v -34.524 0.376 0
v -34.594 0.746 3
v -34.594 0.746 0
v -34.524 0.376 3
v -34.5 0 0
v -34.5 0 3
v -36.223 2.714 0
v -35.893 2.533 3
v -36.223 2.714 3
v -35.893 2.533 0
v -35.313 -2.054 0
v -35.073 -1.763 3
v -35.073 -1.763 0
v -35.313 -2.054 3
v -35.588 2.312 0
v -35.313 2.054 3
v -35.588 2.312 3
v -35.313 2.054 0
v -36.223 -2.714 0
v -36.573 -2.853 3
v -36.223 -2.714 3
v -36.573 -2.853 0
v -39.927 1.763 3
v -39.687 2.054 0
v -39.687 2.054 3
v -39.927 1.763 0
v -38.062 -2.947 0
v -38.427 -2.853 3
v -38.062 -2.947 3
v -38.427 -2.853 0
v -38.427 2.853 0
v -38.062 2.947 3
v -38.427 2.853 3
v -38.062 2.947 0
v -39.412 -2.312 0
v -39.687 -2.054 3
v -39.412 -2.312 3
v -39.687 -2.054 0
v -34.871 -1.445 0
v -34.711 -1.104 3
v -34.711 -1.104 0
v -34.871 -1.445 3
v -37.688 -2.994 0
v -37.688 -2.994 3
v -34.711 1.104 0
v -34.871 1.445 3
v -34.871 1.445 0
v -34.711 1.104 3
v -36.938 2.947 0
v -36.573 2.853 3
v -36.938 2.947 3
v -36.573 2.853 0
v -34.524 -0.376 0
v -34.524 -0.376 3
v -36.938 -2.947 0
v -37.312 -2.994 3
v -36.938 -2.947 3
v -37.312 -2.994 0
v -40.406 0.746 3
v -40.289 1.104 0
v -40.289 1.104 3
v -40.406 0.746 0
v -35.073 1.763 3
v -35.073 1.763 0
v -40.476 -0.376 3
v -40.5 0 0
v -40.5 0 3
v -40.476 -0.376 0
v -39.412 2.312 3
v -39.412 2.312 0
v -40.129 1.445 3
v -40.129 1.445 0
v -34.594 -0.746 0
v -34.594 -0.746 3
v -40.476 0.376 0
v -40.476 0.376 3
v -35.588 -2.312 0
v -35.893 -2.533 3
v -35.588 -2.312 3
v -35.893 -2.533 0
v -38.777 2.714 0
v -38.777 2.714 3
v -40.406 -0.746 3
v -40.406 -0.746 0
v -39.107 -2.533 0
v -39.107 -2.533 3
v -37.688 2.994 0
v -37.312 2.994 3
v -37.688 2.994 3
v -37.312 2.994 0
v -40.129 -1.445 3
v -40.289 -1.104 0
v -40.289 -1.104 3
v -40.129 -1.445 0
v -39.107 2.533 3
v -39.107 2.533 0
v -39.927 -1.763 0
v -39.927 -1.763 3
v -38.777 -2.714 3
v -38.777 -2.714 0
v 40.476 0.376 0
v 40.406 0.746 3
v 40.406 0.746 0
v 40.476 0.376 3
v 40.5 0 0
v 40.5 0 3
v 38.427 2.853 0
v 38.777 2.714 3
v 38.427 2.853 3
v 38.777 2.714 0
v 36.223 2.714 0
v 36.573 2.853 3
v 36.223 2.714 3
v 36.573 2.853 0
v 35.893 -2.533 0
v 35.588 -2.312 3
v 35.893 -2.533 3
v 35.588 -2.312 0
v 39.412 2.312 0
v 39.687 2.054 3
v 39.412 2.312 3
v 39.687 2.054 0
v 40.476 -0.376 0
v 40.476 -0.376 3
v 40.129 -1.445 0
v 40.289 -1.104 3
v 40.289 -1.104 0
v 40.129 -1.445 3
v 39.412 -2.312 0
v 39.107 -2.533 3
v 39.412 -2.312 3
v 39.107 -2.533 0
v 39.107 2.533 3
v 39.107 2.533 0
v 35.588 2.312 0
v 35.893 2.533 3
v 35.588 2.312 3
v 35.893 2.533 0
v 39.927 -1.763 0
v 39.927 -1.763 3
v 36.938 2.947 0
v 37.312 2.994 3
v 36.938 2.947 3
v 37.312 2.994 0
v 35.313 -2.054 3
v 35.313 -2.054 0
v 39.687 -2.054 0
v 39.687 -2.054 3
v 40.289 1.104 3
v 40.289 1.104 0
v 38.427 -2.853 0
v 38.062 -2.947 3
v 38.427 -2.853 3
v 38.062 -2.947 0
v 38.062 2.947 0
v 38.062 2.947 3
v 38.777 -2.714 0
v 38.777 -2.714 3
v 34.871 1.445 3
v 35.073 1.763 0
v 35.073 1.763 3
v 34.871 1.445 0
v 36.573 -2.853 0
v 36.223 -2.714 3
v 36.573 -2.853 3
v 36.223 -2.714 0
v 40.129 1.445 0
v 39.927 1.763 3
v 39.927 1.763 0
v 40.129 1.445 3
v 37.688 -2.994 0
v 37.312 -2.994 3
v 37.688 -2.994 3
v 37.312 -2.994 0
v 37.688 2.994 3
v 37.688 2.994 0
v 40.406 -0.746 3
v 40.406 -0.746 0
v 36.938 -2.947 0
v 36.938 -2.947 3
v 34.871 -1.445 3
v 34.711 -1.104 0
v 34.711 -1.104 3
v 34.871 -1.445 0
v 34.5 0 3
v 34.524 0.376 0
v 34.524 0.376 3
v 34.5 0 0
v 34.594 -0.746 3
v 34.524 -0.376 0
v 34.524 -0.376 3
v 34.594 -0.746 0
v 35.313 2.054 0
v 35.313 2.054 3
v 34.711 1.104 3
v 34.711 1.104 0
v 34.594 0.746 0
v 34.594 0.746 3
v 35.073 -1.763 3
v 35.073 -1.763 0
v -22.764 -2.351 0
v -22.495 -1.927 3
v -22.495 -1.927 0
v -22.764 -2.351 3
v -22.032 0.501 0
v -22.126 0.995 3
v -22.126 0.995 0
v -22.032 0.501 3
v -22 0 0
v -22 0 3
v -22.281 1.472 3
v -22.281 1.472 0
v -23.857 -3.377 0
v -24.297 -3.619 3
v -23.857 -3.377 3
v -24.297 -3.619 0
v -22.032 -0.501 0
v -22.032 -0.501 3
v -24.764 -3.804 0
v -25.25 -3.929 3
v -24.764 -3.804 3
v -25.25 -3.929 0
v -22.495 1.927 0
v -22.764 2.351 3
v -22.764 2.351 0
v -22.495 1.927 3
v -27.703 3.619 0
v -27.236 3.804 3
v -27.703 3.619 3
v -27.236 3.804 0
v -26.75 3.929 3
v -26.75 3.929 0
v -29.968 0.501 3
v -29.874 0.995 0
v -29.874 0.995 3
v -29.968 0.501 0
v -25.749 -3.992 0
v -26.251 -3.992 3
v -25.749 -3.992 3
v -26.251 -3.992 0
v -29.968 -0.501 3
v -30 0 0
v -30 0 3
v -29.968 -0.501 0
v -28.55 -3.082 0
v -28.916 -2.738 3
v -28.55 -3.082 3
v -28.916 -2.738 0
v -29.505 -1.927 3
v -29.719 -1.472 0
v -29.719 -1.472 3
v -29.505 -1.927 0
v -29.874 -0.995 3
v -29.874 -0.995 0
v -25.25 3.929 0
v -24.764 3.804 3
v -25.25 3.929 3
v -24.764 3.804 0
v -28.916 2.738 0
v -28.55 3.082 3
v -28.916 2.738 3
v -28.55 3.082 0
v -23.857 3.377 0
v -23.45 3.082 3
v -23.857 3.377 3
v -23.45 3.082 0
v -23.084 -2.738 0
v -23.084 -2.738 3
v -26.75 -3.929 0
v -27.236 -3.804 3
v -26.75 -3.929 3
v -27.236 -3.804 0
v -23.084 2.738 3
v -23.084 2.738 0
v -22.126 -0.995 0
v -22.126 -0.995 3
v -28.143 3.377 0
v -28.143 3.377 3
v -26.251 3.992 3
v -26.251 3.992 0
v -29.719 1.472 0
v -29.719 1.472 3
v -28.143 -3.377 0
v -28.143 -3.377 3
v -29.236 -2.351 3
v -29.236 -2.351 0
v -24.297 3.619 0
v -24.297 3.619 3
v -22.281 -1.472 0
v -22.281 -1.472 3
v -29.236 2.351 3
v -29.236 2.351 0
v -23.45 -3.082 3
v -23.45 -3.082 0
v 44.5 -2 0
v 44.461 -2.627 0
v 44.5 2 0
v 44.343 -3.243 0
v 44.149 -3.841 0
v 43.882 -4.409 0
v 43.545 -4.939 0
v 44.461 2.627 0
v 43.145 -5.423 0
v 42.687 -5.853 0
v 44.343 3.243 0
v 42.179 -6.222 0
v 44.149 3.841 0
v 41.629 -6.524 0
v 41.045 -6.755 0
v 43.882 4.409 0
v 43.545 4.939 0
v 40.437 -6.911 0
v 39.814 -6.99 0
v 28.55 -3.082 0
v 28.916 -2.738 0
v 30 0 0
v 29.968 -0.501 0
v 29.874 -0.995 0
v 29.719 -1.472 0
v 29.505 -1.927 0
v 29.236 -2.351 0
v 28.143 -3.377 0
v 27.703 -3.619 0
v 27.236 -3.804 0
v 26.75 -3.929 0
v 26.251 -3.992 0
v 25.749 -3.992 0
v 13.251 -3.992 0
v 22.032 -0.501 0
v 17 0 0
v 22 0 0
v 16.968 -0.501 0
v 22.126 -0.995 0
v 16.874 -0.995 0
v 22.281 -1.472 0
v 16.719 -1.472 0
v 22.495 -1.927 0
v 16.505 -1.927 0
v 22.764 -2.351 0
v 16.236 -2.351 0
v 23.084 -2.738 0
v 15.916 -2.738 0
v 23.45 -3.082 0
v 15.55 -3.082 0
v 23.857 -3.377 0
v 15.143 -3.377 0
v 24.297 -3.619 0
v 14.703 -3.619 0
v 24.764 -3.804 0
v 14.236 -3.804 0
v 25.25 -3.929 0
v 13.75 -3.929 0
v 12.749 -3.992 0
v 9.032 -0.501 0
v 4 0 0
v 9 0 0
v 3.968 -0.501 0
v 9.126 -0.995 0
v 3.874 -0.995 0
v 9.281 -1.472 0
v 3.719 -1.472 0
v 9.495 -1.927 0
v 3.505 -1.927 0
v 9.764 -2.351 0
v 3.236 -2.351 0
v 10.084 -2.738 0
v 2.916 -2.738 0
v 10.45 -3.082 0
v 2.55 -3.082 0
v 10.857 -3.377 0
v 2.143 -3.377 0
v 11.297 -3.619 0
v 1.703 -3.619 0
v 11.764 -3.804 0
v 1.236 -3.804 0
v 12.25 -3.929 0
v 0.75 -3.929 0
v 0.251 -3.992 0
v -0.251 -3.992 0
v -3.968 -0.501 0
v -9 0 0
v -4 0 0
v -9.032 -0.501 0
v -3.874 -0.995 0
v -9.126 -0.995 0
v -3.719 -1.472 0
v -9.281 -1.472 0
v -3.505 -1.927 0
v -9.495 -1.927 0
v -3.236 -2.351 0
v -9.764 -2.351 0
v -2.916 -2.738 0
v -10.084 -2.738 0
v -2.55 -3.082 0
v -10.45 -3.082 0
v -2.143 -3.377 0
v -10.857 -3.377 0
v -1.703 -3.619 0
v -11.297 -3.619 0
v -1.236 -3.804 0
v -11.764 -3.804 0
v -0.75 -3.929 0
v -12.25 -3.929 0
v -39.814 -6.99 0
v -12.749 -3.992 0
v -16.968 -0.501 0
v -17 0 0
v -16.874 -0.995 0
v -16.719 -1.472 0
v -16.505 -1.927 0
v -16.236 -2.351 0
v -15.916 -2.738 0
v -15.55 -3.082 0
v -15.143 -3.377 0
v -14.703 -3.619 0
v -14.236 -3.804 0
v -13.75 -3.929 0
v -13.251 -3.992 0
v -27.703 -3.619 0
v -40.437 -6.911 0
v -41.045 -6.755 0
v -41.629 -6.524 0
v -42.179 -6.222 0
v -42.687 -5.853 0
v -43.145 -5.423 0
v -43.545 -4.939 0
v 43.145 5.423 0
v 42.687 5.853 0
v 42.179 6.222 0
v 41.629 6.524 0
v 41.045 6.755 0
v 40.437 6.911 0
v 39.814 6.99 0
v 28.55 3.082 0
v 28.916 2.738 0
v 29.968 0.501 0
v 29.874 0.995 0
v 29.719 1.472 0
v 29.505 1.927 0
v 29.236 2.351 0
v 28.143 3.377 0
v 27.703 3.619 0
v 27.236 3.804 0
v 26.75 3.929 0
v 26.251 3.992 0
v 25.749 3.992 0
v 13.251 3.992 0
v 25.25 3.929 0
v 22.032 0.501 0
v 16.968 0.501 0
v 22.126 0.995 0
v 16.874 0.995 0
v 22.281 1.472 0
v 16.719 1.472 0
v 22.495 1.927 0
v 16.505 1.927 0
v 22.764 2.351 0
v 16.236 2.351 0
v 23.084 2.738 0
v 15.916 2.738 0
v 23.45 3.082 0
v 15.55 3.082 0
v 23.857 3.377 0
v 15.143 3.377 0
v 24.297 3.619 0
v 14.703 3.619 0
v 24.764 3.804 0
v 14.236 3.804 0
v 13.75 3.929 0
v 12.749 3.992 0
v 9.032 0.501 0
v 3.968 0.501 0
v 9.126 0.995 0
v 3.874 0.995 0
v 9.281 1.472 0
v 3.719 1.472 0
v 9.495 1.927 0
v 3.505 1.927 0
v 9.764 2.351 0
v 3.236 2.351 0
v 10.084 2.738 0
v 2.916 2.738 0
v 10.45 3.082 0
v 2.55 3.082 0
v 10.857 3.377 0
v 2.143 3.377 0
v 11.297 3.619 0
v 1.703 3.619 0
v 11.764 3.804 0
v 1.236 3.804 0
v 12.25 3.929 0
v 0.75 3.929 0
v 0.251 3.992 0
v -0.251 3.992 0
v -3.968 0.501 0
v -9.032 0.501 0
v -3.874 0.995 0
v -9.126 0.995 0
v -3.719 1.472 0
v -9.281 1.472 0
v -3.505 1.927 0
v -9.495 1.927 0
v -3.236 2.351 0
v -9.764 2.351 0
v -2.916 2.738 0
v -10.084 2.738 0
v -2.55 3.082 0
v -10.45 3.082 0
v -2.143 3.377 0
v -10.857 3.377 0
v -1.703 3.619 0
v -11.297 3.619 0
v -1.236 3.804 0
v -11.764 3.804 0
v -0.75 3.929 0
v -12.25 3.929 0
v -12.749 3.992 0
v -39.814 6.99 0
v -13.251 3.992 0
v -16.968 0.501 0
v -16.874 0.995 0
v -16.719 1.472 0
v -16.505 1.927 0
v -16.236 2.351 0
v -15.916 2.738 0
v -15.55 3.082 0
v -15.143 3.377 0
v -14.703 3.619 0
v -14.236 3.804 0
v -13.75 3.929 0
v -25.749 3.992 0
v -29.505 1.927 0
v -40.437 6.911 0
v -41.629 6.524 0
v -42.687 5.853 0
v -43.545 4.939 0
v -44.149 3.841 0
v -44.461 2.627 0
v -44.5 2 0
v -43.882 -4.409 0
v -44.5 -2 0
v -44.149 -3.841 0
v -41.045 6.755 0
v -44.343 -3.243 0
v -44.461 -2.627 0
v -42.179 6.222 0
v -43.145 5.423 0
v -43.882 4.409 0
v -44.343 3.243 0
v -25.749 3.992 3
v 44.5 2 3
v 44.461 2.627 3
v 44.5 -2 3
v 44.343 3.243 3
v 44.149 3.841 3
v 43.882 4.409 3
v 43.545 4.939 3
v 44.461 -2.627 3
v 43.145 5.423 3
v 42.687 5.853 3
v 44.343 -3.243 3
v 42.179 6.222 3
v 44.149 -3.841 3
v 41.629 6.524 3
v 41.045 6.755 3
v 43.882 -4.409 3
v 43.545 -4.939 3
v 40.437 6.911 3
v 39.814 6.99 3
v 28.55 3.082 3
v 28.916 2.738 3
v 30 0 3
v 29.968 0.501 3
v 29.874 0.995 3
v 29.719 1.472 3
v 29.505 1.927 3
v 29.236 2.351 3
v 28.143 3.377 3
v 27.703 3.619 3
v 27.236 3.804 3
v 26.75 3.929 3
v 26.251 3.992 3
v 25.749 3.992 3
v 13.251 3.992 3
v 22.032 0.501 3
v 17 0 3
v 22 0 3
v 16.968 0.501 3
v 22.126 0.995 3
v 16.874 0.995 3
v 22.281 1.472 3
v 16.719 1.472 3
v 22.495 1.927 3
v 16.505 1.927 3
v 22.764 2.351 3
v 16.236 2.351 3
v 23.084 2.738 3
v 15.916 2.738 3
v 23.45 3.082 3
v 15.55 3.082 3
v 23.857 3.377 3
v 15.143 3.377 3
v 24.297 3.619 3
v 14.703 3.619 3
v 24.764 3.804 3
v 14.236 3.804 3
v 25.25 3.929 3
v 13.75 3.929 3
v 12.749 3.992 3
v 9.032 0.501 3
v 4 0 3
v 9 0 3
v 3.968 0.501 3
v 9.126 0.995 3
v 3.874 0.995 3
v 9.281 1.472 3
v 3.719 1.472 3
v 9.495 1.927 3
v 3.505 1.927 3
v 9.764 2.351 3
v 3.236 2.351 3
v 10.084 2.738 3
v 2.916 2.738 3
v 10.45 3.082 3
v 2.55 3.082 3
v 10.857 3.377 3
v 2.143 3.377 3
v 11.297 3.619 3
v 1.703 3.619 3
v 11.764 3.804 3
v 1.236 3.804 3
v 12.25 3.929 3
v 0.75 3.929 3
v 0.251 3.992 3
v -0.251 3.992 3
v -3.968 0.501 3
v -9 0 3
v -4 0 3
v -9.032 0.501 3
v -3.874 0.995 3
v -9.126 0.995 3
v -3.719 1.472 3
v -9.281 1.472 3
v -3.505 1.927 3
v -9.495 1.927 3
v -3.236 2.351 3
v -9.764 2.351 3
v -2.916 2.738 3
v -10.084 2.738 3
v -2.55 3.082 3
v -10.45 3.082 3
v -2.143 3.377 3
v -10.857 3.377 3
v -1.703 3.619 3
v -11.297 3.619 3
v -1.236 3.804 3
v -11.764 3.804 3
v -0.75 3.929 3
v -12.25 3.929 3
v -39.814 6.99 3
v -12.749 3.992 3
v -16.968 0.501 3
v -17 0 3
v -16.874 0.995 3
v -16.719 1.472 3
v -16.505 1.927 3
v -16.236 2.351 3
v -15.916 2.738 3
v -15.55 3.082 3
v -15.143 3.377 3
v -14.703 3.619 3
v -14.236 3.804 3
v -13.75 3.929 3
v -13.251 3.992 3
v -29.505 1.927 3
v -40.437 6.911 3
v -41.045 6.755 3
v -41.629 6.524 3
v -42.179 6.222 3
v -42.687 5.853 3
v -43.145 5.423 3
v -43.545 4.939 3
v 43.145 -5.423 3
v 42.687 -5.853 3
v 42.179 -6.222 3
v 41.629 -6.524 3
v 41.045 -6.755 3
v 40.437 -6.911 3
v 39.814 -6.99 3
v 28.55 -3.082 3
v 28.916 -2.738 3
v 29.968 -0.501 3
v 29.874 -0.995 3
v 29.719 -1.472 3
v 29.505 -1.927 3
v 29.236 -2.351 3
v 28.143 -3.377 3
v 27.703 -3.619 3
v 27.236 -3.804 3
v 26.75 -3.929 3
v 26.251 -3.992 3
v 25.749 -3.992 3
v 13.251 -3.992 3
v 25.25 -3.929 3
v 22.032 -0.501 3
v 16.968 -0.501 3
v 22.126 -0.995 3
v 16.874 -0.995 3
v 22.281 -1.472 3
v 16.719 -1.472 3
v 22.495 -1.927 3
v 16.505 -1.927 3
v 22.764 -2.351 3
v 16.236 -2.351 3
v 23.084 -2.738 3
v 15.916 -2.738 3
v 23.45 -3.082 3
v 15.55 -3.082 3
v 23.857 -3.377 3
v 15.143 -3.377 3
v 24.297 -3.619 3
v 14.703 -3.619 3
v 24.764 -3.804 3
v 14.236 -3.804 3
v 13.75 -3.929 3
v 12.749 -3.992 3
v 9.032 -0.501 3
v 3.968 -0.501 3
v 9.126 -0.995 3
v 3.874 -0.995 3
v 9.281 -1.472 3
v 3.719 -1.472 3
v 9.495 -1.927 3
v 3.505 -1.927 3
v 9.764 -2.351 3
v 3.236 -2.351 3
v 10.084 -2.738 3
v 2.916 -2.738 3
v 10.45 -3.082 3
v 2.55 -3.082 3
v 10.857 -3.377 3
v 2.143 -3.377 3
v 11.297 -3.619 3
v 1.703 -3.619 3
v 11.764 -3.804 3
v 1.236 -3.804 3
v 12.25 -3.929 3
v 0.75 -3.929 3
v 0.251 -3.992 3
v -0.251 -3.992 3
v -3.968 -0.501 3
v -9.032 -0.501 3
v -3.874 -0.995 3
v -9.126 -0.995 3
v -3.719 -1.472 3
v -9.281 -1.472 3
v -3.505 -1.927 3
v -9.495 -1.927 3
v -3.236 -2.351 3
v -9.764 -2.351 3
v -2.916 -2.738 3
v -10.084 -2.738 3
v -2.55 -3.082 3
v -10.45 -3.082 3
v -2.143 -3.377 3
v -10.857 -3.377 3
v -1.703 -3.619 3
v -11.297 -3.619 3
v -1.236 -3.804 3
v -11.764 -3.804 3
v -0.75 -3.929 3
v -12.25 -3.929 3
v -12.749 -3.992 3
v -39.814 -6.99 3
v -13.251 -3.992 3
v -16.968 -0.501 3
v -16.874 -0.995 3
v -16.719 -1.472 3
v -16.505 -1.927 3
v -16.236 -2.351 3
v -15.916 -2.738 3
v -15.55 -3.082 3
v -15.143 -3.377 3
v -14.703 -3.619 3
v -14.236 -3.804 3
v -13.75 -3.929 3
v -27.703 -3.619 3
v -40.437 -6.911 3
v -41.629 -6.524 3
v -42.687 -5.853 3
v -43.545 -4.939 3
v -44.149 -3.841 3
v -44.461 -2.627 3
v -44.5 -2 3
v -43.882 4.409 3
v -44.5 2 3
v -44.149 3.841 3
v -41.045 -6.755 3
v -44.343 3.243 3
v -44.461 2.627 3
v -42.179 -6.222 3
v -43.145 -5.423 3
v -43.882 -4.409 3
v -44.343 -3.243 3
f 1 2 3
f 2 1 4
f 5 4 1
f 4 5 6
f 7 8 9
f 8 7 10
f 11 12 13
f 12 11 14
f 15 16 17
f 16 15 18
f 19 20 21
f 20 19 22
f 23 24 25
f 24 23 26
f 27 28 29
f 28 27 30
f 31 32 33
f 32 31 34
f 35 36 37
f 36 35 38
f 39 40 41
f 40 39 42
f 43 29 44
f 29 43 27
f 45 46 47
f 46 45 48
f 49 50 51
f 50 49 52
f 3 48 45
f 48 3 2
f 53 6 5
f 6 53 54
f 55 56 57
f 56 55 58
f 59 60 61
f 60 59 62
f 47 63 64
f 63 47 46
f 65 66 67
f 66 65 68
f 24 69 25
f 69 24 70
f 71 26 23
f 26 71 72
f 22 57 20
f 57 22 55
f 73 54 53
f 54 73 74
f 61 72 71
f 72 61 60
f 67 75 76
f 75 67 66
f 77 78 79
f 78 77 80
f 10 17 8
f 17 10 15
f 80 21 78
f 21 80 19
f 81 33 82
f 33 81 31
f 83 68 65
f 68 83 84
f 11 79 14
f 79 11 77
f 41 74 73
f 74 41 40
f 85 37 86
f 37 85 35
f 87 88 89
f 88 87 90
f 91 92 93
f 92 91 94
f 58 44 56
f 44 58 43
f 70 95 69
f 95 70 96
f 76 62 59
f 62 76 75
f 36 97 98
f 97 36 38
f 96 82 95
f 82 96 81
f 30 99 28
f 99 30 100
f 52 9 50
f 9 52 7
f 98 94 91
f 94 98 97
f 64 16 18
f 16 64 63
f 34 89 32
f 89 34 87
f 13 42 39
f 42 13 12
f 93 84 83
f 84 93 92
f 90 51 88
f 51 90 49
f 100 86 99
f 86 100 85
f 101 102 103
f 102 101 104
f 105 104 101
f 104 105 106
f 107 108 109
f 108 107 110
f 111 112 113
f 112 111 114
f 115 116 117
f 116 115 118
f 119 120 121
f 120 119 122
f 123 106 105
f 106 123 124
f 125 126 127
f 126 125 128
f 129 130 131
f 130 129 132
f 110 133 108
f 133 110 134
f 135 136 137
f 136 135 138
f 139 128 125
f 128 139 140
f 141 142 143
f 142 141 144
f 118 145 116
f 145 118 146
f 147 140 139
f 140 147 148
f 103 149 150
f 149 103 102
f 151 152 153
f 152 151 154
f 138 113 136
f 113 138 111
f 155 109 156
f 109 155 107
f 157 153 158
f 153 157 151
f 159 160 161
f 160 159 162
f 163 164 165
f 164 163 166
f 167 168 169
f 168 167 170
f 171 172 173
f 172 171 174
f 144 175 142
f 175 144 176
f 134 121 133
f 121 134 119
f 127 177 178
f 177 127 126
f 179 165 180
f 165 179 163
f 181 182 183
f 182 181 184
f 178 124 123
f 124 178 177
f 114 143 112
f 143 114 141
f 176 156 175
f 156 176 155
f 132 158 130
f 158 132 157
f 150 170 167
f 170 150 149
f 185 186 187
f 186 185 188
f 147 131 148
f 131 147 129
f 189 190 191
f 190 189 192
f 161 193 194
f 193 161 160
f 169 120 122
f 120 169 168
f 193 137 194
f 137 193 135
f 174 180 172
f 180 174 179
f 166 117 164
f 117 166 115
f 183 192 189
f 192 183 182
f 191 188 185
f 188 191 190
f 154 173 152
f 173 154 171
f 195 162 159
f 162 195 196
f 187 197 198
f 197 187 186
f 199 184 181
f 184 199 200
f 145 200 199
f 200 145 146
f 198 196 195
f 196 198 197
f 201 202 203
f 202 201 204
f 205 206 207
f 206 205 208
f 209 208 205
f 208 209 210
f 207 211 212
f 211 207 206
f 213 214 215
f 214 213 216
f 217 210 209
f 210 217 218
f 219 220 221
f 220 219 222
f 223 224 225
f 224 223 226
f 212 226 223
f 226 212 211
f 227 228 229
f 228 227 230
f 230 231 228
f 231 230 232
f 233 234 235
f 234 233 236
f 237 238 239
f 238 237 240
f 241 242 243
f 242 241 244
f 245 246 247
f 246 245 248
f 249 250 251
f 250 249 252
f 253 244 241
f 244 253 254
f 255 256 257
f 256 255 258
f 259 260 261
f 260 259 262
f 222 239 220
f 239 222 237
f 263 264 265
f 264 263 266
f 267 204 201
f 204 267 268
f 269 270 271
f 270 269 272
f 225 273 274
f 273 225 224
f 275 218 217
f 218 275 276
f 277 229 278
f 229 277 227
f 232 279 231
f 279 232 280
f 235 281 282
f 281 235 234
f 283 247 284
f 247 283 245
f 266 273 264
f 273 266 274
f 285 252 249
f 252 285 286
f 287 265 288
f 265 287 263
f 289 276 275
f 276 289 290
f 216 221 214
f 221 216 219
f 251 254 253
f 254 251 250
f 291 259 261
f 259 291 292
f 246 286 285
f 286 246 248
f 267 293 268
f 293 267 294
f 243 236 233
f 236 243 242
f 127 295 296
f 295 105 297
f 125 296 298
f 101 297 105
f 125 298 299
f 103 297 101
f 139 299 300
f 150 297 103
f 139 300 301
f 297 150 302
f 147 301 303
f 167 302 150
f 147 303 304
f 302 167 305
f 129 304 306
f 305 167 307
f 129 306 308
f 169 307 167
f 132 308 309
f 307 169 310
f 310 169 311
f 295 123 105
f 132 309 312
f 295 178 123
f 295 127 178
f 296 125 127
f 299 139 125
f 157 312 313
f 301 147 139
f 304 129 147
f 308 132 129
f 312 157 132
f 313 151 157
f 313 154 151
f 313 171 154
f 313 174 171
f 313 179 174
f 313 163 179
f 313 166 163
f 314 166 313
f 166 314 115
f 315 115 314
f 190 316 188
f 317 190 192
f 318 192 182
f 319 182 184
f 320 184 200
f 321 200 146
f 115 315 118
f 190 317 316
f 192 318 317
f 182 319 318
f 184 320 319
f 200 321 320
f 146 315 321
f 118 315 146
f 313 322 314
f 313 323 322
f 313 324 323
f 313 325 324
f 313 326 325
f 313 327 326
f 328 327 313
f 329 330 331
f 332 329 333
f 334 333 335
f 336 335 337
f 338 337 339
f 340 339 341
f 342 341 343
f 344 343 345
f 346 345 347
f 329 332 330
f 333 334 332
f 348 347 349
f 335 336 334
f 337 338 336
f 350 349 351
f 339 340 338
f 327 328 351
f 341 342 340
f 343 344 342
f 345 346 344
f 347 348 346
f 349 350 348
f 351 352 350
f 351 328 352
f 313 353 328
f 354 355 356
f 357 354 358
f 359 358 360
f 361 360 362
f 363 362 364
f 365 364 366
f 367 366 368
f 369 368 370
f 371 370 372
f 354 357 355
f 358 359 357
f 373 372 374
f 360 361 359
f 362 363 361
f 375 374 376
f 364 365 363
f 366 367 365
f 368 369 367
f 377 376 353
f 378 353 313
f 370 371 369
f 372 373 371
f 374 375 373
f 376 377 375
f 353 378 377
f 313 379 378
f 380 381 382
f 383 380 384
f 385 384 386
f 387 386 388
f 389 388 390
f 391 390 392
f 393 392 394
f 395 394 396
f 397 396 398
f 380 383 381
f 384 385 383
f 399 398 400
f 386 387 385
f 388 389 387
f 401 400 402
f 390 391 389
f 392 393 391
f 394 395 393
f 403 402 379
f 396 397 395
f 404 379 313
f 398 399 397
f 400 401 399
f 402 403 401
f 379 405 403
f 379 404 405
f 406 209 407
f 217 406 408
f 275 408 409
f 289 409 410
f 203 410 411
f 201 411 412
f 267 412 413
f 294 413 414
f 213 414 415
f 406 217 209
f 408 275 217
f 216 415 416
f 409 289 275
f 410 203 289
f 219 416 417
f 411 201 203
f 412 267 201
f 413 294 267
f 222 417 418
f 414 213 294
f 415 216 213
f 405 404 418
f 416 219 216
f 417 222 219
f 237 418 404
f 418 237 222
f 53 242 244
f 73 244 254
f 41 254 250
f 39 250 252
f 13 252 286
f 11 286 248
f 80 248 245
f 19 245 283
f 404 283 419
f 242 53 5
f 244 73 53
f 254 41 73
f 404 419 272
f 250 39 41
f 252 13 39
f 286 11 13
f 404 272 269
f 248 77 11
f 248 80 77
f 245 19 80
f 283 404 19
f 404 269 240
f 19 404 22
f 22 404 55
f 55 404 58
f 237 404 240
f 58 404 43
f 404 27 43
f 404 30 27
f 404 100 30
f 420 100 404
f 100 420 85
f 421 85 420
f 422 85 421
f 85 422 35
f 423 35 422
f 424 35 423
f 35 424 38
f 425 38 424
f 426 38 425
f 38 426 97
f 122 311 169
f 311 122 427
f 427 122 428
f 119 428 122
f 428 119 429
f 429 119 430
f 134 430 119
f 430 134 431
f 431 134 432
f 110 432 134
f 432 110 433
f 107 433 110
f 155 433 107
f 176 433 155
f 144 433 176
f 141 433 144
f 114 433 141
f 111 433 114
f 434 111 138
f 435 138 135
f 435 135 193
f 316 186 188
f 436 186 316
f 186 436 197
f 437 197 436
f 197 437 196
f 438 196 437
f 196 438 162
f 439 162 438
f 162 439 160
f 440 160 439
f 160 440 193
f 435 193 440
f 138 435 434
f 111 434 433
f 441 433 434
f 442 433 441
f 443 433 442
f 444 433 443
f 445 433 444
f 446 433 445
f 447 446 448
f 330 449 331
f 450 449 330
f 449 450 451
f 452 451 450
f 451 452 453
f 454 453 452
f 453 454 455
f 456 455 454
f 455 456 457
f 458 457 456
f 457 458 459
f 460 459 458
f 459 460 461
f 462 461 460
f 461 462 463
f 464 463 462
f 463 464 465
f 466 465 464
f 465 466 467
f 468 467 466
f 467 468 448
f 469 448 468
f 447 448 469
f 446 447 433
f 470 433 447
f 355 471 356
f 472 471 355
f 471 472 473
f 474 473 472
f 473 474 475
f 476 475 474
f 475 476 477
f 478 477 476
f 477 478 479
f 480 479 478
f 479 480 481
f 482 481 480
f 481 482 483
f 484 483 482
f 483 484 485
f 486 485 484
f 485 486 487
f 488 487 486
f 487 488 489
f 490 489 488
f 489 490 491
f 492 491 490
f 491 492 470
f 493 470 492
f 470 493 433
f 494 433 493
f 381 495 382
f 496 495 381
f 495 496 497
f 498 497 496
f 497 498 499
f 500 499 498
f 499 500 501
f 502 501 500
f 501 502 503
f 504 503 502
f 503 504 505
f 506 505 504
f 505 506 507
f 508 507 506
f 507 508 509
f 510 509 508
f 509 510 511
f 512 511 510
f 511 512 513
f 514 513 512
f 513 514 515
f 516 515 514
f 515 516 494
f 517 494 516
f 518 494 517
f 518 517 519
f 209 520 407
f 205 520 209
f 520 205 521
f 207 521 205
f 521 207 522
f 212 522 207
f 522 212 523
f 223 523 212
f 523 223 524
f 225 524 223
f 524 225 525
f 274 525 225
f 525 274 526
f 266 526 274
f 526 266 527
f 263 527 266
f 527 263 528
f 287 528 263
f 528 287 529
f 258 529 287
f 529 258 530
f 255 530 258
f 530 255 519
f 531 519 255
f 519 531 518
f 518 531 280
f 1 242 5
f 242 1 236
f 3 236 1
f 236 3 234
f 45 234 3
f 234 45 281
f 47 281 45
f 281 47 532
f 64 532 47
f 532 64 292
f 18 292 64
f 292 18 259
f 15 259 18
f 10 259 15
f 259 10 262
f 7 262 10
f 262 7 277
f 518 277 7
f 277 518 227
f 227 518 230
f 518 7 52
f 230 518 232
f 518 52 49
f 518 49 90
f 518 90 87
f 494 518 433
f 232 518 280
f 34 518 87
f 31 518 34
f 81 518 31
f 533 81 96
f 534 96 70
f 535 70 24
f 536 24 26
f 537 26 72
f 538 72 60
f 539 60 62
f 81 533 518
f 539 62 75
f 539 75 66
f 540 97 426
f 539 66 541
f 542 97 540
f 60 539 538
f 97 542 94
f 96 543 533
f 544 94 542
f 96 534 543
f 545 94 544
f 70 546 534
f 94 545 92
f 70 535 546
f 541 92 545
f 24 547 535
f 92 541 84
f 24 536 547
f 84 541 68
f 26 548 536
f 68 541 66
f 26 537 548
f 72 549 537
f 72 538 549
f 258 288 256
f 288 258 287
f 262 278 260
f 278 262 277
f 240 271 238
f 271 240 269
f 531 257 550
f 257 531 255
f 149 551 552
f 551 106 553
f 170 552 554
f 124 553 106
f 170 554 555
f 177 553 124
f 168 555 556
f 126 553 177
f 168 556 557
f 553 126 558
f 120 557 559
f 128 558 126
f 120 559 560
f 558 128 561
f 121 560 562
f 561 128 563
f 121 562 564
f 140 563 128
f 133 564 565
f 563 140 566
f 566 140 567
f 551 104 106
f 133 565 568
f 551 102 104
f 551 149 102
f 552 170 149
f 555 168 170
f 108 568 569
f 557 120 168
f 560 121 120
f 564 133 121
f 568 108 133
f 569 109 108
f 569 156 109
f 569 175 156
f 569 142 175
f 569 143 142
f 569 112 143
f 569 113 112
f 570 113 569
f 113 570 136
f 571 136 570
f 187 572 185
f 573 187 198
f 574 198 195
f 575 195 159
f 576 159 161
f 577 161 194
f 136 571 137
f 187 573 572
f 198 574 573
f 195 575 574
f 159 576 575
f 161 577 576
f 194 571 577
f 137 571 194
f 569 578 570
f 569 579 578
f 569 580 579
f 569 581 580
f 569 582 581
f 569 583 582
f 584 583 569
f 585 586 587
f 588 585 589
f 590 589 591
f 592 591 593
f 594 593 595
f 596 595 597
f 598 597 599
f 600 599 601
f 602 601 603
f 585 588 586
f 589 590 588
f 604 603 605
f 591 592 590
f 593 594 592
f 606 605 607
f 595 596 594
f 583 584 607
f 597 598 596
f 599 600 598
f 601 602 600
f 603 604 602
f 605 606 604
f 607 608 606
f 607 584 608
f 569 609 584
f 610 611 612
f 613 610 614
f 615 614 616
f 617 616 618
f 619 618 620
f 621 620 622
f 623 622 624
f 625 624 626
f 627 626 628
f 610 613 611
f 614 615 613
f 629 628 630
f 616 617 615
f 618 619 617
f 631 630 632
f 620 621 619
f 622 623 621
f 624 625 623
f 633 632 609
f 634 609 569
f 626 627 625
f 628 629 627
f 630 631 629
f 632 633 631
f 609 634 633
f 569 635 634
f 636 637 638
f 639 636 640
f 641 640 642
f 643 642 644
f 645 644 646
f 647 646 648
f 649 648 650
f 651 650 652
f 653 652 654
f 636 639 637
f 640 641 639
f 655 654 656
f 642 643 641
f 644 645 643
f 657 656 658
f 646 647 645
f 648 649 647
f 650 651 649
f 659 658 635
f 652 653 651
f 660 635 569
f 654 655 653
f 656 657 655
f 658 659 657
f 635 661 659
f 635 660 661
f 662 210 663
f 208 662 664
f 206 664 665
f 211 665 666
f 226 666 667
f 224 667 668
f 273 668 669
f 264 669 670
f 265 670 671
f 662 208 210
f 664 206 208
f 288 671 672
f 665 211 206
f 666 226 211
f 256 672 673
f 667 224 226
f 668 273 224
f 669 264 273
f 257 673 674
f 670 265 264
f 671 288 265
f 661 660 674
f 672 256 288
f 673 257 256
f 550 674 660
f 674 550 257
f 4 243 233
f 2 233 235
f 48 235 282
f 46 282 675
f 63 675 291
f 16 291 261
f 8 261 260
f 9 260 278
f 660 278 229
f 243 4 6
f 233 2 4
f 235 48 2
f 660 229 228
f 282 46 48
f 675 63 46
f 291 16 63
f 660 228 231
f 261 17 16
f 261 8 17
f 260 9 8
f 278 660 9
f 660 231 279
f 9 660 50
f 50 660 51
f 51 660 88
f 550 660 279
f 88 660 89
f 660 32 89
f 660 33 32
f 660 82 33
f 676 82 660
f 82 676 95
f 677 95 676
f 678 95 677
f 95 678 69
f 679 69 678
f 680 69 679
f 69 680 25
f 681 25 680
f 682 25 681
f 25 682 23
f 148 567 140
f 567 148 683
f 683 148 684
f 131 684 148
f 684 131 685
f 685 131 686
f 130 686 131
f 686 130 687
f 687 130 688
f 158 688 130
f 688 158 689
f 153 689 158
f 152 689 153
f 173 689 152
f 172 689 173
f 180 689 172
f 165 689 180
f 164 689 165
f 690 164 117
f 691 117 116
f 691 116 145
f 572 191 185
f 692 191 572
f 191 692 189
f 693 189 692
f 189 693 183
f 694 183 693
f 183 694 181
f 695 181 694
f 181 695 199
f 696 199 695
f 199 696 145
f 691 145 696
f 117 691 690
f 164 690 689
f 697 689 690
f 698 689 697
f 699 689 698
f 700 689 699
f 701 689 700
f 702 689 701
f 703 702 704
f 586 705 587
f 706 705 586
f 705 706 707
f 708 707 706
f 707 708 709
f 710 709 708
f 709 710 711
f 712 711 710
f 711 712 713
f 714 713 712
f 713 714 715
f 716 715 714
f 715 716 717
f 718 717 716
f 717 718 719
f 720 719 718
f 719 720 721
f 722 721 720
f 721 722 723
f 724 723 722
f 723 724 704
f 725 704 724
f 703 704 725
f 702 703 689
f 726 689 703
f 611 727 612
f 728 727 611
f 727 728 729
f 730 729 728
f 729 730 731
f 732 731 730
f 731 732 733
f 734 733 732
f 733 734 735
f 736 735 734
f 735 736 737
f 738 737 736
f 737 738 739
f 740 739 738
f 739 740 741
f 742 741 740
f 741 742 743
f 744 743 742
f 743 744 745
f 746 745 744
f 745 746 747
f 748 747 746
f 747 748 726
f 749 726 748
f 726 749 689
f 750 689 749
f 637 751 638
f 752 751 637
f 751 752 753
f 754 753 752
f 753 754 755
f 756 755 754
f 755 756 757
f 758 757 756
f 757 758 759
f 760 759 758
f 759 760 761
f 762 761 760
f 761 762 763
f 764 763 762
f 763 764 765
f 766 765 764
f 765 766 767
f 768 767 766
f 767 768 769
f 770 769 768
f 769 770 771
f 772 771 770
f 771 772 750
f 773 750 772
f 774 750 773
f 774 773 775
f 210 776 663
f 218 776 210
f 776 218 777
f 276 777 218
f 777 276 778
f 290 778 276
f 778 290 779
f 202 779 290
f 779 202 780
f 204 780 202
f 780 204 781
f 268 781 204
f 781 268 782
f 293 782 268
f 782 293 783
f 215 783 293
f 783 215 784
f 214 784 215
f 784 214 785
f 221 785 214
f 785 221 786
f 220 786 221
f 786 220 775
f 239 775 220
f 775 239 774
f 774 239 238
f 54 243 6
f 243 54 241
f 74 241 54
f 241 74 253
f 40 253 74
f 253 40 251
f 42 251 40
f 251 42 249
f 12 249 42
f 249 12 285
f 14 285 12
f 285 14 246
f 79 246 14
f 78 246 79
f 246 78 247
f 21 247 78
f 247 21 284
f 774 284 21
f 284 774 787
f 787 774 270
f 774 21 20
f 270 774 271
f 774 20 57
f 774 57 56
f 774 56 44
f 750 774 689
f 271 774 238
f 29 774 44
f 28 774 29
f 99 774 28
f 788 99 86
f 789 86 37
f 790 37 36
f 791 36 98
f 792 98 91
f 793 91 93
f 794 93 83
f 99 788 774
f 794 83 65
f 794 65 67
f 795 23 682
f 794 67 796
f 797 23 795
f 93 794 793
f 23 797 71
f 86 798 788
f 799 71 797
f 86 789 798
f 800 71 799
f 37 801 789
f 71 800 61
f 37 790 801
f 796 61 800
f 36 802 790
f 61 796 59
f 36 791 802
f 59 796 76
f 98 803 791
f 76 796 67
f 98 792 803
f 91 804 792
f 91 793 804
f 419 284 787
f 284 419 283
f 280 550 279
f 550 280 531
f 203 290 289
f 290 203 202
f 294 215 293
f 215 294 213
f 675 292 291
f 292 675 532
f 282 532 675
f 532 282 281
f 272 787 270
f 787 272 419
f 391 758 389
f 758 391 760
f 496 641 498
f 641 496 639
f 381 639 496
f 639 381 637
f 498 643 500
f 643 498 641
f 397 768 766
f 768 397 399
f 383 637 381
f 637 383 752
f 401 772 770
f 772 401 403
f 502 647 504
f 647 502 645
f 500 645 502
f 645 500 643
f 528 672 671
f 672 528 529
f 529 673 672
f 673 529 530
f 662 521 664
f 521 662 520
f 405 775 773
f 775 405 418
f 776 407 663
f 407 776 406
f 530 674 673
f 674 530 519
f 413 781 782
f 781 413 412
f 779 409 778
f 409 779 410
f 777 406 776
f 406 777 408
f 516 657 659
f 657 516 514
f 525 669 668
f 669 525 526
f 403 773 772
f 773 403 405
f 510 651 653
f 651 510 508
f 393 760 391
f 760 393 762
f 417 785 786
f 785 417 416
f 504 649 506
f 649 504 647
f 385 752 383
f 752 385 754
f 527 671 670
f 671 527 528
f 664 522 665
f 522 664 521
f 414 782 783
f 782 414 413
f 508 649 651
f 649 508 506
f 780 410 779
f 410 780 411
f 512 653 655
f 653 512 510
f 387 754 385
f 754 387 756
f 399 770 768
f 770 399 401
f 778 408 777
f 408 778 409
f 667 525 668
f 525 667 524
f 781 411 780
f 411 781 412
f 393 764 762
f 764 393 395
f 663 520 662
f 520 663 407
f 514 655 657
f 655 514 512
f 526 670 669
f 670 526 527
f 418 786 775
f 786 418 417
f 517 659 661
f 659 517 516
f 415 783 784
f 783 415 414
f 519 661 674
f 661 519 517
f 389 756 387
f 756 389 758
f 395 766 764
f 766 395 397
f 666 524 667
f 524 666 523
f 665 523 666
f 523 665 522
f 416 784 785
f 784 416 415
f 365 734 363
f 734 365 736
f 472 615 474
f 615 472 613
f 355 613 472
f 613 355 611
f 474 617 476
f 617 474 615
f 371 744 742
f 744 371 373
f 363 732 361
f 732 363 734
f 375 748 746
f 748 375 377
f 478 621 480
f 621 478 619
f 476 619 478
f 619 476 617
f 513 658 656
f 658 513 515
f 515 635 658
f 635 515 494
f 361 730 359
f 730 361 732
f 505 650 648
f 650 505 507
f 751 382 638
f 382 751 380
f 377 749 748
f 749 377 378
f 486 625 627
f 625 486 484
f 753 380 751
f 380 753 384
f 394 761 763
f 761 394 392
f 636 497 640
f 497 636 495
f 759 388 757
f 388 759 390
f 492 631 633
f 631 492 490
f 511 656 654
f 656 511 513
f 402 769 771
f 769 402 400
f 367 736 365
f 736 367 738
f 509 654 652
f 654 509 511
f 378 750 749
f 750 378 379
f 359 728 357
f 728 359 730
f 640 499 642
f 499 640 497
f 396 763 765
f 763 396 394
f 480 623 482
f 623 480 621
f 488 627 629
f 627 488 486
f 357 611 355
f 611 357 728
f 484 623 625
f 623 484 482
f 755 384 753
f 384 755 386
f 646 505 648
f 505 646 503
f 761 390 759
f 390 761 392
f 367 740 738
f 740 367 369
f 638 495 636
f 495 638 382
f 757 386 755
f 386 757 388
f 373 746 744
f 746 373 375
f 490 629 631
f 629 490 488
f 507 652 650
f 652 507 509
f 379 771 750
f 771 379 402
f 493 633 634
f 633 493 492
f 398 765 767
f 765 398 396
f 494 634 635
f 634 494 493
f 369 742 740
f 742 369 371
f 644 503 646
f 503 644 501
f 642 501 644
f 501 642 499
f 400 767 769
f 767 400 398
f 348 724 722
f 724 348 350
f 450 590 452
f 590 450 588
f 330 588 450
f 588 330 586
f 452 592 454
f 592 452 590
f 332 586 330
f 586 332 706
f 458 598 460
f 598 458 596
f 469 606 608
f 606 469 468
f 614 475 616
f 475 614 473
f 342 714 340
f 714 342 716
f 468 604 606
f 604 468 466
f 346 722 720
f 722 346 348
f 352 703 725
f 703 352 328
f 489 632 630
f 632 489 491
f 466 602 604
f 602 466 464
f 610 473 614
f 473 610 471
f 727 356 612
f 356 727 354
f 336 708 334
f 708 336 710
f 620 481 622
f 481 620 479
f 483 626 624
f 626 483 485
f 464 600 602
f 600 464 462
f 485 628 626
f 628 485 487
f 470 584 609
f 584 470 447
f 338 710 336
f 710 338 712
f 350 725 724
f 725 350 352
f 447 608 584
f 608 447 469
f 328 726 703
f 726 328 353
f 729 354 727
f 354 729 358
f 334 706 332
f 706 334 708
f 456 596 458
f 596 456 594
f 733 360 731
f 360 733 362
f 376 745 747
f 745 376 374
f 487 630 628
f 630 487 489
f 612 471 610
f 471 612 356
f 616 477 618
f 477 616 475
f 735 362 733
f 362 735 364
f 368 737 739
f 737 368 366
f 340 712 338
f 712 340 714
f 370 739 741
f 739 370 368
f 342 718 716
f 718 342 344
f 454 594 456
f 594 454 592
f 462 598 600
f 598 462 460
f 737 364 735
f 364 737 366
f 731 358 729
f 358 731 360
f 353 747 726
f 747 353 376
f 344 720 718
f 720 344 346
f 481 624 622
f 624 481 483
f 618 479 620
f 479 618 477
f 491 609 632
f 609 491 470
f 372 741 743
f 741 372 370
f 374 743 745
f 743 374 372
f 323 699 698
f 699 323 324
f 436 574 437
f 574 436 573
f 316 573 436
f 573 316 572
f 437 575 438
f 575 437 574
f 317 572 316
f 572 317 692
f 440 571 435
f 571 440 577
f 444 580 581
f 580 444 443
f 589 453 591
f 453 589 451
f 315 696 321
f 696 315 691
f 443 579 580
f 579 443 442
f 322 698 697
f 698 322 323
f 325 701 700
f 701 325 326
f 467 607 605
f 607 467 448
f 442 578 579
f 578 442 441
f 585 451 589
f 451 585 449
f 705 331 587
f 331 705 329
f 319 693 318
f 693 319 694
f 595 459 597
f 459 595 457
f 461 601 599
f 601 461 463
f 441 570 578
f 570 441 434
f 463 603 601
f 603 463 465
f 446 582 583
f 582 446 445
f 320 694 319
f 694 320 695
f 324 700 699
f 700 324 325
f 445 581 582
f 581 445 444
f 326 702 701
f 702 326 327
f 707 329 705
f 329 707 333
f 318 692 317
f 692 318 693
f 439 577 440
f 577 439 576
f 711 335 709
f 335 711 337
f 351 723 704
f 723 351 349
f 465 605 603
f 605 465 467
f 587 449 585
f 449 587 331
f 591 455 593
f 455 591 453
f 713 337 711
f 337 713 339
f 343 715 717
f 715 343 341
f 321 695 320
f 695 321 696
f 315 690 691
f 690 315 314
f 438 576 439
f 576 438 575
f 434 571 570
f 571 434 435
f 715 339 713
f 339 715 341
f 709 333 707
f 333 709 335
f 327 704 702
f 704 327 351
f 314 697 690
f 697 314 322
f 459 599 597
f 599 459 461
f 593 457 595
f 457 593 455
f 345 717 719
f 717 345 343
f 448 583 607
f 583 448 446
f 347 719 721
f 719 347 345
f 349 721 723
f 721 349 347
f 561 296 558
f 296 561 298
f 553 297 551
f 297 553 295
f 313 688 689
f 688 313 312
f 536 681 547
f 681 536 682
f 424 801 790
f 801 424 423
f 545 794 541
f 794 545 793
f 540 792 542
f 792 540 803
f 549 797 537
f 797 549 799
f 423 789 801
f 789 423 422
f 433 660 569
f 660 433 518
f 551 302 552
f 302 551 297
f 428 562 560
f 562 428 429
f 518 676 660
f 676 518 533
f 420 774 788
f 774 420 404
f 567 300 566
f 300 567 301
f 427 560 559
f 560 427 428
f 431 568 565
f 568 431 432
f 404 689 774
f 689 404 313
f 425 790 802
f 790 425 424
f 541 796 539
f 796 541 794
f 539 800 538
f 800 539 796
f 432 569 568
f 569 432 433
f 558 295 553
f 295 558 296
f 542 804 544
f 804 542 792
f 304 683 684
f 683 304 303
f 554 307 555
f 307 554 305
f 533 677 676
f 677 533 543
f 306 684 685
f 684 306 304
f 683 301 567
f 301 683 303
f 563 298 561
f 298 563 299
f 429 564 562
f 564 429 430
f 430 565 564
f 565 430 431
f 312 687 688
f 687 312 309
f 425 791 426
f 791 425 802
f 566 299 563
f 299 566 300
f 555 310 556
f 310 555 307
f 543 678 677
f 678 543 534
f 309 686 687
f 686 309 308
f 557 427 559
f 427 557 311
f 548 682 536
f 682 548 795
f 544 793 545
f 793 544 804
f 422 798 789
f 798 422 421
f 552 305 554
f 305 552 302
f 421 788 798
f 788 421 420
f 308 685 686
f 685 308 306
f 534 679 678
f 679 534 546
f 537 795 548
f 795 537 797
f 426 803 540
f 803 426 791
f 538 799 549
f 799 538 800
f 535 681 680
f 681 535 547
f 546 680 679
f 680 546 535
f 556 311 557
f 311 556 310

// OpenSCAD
$fn = 50;


difference() {
	union() {
		hull() {
			translate(v = [-39.5000000000, 2.0000000000, 0]) {
				cylinder(h = 3, r = 5);
			}
			translate(v = [39.5000000000, 2.0000000000, 0]) {
				cylinder(h = 3, r = 5);
			}
			translate(v = [-39.5000000000, -2.0000000000, 0]) {
				cylinder(h = 3, r = 5);
			}
			translate(v = [39.5000000000, -2.0000000000, 0]) {
				cylinder(h = 3, r = 5);
			}
		}
	}
	union() {
		#translate(v = [-37.5000000000, 0.0000000000, 0]) {
			cylinder(h = 3, r = 3.0000000000);
		}
		#translate(v = [37.5000000000, 0.0000000000, 0]) {
			cylinder(h = 3, r = 3.0000000000);
		}
		#translate(v = [-37.5000000000, 0.0000000000, -100.0000000000]) {
			cylinder(h = 200, r = 3.0000000000);
		}
		#translate(v = [-37.5000000000, 0.0000000000, -100.0000000000]) {
			cylinder(h = 200, r = 3.0000000000);
		}
		#translate(v = [37.5000000000, 0.0000000000, -100.0000000000]) {
			cylinder(h = 200, r = 3.0000000000);
		}
		#translate(v = [37.5000000000, 0.0000000000, -100.0000000000]) {
			cylinder(h = 200, r = 3.0000000000);
		}
		#translate(v = [-37.5000000000, 0.0000000000, 0]) {
			cylinder(h = 3, r = 1.5000000000);
		}
		#translate(v = [37.5000000000, 0.0000000000, 0]) {
			cylinder(h = 3, r = 1.5000000000);
		}
		#translate(v = [-37.5000000000, 0.0000000000, 0]) {
			cylinder(h = 3, r = 1.5000000000);
		}
		#translate(v = [37.5000000000, 0.0000000000, 0]) {
			cylinder(h = 3, r = 1.5000000000);
		}
		#translate(v = [-37.5000000000, 0.0000000000, 0]) {
			cylinder(h = 3, r = 1.5000000000);
		}
		#translate(v = [37.5000000000, 0.0000000000, 0]) {
			cylinder(h = 3, r = 1.5000000000);
		}
		#translate(v = [-26.0000000000, 0, 0]) {
			cylinder(h = 3, r = 4.0000000000);
		}
		#translate(v = [-13.0000000000, 0, 0]) {
			cylinder(h = 3, r = 4.0000000000);
		}
		#cylinder(h = 3, r = 4.0000000000);
		#translate(v = [13.0000000000, 0, 0]) {
			cylinder(h = 3, r = 4.0000000000);
		}
		#translate(v = [26.0000000000, 0, 0]) {
			cylinder(h = 3, r = 4.0000000000);
		}
	}
}
